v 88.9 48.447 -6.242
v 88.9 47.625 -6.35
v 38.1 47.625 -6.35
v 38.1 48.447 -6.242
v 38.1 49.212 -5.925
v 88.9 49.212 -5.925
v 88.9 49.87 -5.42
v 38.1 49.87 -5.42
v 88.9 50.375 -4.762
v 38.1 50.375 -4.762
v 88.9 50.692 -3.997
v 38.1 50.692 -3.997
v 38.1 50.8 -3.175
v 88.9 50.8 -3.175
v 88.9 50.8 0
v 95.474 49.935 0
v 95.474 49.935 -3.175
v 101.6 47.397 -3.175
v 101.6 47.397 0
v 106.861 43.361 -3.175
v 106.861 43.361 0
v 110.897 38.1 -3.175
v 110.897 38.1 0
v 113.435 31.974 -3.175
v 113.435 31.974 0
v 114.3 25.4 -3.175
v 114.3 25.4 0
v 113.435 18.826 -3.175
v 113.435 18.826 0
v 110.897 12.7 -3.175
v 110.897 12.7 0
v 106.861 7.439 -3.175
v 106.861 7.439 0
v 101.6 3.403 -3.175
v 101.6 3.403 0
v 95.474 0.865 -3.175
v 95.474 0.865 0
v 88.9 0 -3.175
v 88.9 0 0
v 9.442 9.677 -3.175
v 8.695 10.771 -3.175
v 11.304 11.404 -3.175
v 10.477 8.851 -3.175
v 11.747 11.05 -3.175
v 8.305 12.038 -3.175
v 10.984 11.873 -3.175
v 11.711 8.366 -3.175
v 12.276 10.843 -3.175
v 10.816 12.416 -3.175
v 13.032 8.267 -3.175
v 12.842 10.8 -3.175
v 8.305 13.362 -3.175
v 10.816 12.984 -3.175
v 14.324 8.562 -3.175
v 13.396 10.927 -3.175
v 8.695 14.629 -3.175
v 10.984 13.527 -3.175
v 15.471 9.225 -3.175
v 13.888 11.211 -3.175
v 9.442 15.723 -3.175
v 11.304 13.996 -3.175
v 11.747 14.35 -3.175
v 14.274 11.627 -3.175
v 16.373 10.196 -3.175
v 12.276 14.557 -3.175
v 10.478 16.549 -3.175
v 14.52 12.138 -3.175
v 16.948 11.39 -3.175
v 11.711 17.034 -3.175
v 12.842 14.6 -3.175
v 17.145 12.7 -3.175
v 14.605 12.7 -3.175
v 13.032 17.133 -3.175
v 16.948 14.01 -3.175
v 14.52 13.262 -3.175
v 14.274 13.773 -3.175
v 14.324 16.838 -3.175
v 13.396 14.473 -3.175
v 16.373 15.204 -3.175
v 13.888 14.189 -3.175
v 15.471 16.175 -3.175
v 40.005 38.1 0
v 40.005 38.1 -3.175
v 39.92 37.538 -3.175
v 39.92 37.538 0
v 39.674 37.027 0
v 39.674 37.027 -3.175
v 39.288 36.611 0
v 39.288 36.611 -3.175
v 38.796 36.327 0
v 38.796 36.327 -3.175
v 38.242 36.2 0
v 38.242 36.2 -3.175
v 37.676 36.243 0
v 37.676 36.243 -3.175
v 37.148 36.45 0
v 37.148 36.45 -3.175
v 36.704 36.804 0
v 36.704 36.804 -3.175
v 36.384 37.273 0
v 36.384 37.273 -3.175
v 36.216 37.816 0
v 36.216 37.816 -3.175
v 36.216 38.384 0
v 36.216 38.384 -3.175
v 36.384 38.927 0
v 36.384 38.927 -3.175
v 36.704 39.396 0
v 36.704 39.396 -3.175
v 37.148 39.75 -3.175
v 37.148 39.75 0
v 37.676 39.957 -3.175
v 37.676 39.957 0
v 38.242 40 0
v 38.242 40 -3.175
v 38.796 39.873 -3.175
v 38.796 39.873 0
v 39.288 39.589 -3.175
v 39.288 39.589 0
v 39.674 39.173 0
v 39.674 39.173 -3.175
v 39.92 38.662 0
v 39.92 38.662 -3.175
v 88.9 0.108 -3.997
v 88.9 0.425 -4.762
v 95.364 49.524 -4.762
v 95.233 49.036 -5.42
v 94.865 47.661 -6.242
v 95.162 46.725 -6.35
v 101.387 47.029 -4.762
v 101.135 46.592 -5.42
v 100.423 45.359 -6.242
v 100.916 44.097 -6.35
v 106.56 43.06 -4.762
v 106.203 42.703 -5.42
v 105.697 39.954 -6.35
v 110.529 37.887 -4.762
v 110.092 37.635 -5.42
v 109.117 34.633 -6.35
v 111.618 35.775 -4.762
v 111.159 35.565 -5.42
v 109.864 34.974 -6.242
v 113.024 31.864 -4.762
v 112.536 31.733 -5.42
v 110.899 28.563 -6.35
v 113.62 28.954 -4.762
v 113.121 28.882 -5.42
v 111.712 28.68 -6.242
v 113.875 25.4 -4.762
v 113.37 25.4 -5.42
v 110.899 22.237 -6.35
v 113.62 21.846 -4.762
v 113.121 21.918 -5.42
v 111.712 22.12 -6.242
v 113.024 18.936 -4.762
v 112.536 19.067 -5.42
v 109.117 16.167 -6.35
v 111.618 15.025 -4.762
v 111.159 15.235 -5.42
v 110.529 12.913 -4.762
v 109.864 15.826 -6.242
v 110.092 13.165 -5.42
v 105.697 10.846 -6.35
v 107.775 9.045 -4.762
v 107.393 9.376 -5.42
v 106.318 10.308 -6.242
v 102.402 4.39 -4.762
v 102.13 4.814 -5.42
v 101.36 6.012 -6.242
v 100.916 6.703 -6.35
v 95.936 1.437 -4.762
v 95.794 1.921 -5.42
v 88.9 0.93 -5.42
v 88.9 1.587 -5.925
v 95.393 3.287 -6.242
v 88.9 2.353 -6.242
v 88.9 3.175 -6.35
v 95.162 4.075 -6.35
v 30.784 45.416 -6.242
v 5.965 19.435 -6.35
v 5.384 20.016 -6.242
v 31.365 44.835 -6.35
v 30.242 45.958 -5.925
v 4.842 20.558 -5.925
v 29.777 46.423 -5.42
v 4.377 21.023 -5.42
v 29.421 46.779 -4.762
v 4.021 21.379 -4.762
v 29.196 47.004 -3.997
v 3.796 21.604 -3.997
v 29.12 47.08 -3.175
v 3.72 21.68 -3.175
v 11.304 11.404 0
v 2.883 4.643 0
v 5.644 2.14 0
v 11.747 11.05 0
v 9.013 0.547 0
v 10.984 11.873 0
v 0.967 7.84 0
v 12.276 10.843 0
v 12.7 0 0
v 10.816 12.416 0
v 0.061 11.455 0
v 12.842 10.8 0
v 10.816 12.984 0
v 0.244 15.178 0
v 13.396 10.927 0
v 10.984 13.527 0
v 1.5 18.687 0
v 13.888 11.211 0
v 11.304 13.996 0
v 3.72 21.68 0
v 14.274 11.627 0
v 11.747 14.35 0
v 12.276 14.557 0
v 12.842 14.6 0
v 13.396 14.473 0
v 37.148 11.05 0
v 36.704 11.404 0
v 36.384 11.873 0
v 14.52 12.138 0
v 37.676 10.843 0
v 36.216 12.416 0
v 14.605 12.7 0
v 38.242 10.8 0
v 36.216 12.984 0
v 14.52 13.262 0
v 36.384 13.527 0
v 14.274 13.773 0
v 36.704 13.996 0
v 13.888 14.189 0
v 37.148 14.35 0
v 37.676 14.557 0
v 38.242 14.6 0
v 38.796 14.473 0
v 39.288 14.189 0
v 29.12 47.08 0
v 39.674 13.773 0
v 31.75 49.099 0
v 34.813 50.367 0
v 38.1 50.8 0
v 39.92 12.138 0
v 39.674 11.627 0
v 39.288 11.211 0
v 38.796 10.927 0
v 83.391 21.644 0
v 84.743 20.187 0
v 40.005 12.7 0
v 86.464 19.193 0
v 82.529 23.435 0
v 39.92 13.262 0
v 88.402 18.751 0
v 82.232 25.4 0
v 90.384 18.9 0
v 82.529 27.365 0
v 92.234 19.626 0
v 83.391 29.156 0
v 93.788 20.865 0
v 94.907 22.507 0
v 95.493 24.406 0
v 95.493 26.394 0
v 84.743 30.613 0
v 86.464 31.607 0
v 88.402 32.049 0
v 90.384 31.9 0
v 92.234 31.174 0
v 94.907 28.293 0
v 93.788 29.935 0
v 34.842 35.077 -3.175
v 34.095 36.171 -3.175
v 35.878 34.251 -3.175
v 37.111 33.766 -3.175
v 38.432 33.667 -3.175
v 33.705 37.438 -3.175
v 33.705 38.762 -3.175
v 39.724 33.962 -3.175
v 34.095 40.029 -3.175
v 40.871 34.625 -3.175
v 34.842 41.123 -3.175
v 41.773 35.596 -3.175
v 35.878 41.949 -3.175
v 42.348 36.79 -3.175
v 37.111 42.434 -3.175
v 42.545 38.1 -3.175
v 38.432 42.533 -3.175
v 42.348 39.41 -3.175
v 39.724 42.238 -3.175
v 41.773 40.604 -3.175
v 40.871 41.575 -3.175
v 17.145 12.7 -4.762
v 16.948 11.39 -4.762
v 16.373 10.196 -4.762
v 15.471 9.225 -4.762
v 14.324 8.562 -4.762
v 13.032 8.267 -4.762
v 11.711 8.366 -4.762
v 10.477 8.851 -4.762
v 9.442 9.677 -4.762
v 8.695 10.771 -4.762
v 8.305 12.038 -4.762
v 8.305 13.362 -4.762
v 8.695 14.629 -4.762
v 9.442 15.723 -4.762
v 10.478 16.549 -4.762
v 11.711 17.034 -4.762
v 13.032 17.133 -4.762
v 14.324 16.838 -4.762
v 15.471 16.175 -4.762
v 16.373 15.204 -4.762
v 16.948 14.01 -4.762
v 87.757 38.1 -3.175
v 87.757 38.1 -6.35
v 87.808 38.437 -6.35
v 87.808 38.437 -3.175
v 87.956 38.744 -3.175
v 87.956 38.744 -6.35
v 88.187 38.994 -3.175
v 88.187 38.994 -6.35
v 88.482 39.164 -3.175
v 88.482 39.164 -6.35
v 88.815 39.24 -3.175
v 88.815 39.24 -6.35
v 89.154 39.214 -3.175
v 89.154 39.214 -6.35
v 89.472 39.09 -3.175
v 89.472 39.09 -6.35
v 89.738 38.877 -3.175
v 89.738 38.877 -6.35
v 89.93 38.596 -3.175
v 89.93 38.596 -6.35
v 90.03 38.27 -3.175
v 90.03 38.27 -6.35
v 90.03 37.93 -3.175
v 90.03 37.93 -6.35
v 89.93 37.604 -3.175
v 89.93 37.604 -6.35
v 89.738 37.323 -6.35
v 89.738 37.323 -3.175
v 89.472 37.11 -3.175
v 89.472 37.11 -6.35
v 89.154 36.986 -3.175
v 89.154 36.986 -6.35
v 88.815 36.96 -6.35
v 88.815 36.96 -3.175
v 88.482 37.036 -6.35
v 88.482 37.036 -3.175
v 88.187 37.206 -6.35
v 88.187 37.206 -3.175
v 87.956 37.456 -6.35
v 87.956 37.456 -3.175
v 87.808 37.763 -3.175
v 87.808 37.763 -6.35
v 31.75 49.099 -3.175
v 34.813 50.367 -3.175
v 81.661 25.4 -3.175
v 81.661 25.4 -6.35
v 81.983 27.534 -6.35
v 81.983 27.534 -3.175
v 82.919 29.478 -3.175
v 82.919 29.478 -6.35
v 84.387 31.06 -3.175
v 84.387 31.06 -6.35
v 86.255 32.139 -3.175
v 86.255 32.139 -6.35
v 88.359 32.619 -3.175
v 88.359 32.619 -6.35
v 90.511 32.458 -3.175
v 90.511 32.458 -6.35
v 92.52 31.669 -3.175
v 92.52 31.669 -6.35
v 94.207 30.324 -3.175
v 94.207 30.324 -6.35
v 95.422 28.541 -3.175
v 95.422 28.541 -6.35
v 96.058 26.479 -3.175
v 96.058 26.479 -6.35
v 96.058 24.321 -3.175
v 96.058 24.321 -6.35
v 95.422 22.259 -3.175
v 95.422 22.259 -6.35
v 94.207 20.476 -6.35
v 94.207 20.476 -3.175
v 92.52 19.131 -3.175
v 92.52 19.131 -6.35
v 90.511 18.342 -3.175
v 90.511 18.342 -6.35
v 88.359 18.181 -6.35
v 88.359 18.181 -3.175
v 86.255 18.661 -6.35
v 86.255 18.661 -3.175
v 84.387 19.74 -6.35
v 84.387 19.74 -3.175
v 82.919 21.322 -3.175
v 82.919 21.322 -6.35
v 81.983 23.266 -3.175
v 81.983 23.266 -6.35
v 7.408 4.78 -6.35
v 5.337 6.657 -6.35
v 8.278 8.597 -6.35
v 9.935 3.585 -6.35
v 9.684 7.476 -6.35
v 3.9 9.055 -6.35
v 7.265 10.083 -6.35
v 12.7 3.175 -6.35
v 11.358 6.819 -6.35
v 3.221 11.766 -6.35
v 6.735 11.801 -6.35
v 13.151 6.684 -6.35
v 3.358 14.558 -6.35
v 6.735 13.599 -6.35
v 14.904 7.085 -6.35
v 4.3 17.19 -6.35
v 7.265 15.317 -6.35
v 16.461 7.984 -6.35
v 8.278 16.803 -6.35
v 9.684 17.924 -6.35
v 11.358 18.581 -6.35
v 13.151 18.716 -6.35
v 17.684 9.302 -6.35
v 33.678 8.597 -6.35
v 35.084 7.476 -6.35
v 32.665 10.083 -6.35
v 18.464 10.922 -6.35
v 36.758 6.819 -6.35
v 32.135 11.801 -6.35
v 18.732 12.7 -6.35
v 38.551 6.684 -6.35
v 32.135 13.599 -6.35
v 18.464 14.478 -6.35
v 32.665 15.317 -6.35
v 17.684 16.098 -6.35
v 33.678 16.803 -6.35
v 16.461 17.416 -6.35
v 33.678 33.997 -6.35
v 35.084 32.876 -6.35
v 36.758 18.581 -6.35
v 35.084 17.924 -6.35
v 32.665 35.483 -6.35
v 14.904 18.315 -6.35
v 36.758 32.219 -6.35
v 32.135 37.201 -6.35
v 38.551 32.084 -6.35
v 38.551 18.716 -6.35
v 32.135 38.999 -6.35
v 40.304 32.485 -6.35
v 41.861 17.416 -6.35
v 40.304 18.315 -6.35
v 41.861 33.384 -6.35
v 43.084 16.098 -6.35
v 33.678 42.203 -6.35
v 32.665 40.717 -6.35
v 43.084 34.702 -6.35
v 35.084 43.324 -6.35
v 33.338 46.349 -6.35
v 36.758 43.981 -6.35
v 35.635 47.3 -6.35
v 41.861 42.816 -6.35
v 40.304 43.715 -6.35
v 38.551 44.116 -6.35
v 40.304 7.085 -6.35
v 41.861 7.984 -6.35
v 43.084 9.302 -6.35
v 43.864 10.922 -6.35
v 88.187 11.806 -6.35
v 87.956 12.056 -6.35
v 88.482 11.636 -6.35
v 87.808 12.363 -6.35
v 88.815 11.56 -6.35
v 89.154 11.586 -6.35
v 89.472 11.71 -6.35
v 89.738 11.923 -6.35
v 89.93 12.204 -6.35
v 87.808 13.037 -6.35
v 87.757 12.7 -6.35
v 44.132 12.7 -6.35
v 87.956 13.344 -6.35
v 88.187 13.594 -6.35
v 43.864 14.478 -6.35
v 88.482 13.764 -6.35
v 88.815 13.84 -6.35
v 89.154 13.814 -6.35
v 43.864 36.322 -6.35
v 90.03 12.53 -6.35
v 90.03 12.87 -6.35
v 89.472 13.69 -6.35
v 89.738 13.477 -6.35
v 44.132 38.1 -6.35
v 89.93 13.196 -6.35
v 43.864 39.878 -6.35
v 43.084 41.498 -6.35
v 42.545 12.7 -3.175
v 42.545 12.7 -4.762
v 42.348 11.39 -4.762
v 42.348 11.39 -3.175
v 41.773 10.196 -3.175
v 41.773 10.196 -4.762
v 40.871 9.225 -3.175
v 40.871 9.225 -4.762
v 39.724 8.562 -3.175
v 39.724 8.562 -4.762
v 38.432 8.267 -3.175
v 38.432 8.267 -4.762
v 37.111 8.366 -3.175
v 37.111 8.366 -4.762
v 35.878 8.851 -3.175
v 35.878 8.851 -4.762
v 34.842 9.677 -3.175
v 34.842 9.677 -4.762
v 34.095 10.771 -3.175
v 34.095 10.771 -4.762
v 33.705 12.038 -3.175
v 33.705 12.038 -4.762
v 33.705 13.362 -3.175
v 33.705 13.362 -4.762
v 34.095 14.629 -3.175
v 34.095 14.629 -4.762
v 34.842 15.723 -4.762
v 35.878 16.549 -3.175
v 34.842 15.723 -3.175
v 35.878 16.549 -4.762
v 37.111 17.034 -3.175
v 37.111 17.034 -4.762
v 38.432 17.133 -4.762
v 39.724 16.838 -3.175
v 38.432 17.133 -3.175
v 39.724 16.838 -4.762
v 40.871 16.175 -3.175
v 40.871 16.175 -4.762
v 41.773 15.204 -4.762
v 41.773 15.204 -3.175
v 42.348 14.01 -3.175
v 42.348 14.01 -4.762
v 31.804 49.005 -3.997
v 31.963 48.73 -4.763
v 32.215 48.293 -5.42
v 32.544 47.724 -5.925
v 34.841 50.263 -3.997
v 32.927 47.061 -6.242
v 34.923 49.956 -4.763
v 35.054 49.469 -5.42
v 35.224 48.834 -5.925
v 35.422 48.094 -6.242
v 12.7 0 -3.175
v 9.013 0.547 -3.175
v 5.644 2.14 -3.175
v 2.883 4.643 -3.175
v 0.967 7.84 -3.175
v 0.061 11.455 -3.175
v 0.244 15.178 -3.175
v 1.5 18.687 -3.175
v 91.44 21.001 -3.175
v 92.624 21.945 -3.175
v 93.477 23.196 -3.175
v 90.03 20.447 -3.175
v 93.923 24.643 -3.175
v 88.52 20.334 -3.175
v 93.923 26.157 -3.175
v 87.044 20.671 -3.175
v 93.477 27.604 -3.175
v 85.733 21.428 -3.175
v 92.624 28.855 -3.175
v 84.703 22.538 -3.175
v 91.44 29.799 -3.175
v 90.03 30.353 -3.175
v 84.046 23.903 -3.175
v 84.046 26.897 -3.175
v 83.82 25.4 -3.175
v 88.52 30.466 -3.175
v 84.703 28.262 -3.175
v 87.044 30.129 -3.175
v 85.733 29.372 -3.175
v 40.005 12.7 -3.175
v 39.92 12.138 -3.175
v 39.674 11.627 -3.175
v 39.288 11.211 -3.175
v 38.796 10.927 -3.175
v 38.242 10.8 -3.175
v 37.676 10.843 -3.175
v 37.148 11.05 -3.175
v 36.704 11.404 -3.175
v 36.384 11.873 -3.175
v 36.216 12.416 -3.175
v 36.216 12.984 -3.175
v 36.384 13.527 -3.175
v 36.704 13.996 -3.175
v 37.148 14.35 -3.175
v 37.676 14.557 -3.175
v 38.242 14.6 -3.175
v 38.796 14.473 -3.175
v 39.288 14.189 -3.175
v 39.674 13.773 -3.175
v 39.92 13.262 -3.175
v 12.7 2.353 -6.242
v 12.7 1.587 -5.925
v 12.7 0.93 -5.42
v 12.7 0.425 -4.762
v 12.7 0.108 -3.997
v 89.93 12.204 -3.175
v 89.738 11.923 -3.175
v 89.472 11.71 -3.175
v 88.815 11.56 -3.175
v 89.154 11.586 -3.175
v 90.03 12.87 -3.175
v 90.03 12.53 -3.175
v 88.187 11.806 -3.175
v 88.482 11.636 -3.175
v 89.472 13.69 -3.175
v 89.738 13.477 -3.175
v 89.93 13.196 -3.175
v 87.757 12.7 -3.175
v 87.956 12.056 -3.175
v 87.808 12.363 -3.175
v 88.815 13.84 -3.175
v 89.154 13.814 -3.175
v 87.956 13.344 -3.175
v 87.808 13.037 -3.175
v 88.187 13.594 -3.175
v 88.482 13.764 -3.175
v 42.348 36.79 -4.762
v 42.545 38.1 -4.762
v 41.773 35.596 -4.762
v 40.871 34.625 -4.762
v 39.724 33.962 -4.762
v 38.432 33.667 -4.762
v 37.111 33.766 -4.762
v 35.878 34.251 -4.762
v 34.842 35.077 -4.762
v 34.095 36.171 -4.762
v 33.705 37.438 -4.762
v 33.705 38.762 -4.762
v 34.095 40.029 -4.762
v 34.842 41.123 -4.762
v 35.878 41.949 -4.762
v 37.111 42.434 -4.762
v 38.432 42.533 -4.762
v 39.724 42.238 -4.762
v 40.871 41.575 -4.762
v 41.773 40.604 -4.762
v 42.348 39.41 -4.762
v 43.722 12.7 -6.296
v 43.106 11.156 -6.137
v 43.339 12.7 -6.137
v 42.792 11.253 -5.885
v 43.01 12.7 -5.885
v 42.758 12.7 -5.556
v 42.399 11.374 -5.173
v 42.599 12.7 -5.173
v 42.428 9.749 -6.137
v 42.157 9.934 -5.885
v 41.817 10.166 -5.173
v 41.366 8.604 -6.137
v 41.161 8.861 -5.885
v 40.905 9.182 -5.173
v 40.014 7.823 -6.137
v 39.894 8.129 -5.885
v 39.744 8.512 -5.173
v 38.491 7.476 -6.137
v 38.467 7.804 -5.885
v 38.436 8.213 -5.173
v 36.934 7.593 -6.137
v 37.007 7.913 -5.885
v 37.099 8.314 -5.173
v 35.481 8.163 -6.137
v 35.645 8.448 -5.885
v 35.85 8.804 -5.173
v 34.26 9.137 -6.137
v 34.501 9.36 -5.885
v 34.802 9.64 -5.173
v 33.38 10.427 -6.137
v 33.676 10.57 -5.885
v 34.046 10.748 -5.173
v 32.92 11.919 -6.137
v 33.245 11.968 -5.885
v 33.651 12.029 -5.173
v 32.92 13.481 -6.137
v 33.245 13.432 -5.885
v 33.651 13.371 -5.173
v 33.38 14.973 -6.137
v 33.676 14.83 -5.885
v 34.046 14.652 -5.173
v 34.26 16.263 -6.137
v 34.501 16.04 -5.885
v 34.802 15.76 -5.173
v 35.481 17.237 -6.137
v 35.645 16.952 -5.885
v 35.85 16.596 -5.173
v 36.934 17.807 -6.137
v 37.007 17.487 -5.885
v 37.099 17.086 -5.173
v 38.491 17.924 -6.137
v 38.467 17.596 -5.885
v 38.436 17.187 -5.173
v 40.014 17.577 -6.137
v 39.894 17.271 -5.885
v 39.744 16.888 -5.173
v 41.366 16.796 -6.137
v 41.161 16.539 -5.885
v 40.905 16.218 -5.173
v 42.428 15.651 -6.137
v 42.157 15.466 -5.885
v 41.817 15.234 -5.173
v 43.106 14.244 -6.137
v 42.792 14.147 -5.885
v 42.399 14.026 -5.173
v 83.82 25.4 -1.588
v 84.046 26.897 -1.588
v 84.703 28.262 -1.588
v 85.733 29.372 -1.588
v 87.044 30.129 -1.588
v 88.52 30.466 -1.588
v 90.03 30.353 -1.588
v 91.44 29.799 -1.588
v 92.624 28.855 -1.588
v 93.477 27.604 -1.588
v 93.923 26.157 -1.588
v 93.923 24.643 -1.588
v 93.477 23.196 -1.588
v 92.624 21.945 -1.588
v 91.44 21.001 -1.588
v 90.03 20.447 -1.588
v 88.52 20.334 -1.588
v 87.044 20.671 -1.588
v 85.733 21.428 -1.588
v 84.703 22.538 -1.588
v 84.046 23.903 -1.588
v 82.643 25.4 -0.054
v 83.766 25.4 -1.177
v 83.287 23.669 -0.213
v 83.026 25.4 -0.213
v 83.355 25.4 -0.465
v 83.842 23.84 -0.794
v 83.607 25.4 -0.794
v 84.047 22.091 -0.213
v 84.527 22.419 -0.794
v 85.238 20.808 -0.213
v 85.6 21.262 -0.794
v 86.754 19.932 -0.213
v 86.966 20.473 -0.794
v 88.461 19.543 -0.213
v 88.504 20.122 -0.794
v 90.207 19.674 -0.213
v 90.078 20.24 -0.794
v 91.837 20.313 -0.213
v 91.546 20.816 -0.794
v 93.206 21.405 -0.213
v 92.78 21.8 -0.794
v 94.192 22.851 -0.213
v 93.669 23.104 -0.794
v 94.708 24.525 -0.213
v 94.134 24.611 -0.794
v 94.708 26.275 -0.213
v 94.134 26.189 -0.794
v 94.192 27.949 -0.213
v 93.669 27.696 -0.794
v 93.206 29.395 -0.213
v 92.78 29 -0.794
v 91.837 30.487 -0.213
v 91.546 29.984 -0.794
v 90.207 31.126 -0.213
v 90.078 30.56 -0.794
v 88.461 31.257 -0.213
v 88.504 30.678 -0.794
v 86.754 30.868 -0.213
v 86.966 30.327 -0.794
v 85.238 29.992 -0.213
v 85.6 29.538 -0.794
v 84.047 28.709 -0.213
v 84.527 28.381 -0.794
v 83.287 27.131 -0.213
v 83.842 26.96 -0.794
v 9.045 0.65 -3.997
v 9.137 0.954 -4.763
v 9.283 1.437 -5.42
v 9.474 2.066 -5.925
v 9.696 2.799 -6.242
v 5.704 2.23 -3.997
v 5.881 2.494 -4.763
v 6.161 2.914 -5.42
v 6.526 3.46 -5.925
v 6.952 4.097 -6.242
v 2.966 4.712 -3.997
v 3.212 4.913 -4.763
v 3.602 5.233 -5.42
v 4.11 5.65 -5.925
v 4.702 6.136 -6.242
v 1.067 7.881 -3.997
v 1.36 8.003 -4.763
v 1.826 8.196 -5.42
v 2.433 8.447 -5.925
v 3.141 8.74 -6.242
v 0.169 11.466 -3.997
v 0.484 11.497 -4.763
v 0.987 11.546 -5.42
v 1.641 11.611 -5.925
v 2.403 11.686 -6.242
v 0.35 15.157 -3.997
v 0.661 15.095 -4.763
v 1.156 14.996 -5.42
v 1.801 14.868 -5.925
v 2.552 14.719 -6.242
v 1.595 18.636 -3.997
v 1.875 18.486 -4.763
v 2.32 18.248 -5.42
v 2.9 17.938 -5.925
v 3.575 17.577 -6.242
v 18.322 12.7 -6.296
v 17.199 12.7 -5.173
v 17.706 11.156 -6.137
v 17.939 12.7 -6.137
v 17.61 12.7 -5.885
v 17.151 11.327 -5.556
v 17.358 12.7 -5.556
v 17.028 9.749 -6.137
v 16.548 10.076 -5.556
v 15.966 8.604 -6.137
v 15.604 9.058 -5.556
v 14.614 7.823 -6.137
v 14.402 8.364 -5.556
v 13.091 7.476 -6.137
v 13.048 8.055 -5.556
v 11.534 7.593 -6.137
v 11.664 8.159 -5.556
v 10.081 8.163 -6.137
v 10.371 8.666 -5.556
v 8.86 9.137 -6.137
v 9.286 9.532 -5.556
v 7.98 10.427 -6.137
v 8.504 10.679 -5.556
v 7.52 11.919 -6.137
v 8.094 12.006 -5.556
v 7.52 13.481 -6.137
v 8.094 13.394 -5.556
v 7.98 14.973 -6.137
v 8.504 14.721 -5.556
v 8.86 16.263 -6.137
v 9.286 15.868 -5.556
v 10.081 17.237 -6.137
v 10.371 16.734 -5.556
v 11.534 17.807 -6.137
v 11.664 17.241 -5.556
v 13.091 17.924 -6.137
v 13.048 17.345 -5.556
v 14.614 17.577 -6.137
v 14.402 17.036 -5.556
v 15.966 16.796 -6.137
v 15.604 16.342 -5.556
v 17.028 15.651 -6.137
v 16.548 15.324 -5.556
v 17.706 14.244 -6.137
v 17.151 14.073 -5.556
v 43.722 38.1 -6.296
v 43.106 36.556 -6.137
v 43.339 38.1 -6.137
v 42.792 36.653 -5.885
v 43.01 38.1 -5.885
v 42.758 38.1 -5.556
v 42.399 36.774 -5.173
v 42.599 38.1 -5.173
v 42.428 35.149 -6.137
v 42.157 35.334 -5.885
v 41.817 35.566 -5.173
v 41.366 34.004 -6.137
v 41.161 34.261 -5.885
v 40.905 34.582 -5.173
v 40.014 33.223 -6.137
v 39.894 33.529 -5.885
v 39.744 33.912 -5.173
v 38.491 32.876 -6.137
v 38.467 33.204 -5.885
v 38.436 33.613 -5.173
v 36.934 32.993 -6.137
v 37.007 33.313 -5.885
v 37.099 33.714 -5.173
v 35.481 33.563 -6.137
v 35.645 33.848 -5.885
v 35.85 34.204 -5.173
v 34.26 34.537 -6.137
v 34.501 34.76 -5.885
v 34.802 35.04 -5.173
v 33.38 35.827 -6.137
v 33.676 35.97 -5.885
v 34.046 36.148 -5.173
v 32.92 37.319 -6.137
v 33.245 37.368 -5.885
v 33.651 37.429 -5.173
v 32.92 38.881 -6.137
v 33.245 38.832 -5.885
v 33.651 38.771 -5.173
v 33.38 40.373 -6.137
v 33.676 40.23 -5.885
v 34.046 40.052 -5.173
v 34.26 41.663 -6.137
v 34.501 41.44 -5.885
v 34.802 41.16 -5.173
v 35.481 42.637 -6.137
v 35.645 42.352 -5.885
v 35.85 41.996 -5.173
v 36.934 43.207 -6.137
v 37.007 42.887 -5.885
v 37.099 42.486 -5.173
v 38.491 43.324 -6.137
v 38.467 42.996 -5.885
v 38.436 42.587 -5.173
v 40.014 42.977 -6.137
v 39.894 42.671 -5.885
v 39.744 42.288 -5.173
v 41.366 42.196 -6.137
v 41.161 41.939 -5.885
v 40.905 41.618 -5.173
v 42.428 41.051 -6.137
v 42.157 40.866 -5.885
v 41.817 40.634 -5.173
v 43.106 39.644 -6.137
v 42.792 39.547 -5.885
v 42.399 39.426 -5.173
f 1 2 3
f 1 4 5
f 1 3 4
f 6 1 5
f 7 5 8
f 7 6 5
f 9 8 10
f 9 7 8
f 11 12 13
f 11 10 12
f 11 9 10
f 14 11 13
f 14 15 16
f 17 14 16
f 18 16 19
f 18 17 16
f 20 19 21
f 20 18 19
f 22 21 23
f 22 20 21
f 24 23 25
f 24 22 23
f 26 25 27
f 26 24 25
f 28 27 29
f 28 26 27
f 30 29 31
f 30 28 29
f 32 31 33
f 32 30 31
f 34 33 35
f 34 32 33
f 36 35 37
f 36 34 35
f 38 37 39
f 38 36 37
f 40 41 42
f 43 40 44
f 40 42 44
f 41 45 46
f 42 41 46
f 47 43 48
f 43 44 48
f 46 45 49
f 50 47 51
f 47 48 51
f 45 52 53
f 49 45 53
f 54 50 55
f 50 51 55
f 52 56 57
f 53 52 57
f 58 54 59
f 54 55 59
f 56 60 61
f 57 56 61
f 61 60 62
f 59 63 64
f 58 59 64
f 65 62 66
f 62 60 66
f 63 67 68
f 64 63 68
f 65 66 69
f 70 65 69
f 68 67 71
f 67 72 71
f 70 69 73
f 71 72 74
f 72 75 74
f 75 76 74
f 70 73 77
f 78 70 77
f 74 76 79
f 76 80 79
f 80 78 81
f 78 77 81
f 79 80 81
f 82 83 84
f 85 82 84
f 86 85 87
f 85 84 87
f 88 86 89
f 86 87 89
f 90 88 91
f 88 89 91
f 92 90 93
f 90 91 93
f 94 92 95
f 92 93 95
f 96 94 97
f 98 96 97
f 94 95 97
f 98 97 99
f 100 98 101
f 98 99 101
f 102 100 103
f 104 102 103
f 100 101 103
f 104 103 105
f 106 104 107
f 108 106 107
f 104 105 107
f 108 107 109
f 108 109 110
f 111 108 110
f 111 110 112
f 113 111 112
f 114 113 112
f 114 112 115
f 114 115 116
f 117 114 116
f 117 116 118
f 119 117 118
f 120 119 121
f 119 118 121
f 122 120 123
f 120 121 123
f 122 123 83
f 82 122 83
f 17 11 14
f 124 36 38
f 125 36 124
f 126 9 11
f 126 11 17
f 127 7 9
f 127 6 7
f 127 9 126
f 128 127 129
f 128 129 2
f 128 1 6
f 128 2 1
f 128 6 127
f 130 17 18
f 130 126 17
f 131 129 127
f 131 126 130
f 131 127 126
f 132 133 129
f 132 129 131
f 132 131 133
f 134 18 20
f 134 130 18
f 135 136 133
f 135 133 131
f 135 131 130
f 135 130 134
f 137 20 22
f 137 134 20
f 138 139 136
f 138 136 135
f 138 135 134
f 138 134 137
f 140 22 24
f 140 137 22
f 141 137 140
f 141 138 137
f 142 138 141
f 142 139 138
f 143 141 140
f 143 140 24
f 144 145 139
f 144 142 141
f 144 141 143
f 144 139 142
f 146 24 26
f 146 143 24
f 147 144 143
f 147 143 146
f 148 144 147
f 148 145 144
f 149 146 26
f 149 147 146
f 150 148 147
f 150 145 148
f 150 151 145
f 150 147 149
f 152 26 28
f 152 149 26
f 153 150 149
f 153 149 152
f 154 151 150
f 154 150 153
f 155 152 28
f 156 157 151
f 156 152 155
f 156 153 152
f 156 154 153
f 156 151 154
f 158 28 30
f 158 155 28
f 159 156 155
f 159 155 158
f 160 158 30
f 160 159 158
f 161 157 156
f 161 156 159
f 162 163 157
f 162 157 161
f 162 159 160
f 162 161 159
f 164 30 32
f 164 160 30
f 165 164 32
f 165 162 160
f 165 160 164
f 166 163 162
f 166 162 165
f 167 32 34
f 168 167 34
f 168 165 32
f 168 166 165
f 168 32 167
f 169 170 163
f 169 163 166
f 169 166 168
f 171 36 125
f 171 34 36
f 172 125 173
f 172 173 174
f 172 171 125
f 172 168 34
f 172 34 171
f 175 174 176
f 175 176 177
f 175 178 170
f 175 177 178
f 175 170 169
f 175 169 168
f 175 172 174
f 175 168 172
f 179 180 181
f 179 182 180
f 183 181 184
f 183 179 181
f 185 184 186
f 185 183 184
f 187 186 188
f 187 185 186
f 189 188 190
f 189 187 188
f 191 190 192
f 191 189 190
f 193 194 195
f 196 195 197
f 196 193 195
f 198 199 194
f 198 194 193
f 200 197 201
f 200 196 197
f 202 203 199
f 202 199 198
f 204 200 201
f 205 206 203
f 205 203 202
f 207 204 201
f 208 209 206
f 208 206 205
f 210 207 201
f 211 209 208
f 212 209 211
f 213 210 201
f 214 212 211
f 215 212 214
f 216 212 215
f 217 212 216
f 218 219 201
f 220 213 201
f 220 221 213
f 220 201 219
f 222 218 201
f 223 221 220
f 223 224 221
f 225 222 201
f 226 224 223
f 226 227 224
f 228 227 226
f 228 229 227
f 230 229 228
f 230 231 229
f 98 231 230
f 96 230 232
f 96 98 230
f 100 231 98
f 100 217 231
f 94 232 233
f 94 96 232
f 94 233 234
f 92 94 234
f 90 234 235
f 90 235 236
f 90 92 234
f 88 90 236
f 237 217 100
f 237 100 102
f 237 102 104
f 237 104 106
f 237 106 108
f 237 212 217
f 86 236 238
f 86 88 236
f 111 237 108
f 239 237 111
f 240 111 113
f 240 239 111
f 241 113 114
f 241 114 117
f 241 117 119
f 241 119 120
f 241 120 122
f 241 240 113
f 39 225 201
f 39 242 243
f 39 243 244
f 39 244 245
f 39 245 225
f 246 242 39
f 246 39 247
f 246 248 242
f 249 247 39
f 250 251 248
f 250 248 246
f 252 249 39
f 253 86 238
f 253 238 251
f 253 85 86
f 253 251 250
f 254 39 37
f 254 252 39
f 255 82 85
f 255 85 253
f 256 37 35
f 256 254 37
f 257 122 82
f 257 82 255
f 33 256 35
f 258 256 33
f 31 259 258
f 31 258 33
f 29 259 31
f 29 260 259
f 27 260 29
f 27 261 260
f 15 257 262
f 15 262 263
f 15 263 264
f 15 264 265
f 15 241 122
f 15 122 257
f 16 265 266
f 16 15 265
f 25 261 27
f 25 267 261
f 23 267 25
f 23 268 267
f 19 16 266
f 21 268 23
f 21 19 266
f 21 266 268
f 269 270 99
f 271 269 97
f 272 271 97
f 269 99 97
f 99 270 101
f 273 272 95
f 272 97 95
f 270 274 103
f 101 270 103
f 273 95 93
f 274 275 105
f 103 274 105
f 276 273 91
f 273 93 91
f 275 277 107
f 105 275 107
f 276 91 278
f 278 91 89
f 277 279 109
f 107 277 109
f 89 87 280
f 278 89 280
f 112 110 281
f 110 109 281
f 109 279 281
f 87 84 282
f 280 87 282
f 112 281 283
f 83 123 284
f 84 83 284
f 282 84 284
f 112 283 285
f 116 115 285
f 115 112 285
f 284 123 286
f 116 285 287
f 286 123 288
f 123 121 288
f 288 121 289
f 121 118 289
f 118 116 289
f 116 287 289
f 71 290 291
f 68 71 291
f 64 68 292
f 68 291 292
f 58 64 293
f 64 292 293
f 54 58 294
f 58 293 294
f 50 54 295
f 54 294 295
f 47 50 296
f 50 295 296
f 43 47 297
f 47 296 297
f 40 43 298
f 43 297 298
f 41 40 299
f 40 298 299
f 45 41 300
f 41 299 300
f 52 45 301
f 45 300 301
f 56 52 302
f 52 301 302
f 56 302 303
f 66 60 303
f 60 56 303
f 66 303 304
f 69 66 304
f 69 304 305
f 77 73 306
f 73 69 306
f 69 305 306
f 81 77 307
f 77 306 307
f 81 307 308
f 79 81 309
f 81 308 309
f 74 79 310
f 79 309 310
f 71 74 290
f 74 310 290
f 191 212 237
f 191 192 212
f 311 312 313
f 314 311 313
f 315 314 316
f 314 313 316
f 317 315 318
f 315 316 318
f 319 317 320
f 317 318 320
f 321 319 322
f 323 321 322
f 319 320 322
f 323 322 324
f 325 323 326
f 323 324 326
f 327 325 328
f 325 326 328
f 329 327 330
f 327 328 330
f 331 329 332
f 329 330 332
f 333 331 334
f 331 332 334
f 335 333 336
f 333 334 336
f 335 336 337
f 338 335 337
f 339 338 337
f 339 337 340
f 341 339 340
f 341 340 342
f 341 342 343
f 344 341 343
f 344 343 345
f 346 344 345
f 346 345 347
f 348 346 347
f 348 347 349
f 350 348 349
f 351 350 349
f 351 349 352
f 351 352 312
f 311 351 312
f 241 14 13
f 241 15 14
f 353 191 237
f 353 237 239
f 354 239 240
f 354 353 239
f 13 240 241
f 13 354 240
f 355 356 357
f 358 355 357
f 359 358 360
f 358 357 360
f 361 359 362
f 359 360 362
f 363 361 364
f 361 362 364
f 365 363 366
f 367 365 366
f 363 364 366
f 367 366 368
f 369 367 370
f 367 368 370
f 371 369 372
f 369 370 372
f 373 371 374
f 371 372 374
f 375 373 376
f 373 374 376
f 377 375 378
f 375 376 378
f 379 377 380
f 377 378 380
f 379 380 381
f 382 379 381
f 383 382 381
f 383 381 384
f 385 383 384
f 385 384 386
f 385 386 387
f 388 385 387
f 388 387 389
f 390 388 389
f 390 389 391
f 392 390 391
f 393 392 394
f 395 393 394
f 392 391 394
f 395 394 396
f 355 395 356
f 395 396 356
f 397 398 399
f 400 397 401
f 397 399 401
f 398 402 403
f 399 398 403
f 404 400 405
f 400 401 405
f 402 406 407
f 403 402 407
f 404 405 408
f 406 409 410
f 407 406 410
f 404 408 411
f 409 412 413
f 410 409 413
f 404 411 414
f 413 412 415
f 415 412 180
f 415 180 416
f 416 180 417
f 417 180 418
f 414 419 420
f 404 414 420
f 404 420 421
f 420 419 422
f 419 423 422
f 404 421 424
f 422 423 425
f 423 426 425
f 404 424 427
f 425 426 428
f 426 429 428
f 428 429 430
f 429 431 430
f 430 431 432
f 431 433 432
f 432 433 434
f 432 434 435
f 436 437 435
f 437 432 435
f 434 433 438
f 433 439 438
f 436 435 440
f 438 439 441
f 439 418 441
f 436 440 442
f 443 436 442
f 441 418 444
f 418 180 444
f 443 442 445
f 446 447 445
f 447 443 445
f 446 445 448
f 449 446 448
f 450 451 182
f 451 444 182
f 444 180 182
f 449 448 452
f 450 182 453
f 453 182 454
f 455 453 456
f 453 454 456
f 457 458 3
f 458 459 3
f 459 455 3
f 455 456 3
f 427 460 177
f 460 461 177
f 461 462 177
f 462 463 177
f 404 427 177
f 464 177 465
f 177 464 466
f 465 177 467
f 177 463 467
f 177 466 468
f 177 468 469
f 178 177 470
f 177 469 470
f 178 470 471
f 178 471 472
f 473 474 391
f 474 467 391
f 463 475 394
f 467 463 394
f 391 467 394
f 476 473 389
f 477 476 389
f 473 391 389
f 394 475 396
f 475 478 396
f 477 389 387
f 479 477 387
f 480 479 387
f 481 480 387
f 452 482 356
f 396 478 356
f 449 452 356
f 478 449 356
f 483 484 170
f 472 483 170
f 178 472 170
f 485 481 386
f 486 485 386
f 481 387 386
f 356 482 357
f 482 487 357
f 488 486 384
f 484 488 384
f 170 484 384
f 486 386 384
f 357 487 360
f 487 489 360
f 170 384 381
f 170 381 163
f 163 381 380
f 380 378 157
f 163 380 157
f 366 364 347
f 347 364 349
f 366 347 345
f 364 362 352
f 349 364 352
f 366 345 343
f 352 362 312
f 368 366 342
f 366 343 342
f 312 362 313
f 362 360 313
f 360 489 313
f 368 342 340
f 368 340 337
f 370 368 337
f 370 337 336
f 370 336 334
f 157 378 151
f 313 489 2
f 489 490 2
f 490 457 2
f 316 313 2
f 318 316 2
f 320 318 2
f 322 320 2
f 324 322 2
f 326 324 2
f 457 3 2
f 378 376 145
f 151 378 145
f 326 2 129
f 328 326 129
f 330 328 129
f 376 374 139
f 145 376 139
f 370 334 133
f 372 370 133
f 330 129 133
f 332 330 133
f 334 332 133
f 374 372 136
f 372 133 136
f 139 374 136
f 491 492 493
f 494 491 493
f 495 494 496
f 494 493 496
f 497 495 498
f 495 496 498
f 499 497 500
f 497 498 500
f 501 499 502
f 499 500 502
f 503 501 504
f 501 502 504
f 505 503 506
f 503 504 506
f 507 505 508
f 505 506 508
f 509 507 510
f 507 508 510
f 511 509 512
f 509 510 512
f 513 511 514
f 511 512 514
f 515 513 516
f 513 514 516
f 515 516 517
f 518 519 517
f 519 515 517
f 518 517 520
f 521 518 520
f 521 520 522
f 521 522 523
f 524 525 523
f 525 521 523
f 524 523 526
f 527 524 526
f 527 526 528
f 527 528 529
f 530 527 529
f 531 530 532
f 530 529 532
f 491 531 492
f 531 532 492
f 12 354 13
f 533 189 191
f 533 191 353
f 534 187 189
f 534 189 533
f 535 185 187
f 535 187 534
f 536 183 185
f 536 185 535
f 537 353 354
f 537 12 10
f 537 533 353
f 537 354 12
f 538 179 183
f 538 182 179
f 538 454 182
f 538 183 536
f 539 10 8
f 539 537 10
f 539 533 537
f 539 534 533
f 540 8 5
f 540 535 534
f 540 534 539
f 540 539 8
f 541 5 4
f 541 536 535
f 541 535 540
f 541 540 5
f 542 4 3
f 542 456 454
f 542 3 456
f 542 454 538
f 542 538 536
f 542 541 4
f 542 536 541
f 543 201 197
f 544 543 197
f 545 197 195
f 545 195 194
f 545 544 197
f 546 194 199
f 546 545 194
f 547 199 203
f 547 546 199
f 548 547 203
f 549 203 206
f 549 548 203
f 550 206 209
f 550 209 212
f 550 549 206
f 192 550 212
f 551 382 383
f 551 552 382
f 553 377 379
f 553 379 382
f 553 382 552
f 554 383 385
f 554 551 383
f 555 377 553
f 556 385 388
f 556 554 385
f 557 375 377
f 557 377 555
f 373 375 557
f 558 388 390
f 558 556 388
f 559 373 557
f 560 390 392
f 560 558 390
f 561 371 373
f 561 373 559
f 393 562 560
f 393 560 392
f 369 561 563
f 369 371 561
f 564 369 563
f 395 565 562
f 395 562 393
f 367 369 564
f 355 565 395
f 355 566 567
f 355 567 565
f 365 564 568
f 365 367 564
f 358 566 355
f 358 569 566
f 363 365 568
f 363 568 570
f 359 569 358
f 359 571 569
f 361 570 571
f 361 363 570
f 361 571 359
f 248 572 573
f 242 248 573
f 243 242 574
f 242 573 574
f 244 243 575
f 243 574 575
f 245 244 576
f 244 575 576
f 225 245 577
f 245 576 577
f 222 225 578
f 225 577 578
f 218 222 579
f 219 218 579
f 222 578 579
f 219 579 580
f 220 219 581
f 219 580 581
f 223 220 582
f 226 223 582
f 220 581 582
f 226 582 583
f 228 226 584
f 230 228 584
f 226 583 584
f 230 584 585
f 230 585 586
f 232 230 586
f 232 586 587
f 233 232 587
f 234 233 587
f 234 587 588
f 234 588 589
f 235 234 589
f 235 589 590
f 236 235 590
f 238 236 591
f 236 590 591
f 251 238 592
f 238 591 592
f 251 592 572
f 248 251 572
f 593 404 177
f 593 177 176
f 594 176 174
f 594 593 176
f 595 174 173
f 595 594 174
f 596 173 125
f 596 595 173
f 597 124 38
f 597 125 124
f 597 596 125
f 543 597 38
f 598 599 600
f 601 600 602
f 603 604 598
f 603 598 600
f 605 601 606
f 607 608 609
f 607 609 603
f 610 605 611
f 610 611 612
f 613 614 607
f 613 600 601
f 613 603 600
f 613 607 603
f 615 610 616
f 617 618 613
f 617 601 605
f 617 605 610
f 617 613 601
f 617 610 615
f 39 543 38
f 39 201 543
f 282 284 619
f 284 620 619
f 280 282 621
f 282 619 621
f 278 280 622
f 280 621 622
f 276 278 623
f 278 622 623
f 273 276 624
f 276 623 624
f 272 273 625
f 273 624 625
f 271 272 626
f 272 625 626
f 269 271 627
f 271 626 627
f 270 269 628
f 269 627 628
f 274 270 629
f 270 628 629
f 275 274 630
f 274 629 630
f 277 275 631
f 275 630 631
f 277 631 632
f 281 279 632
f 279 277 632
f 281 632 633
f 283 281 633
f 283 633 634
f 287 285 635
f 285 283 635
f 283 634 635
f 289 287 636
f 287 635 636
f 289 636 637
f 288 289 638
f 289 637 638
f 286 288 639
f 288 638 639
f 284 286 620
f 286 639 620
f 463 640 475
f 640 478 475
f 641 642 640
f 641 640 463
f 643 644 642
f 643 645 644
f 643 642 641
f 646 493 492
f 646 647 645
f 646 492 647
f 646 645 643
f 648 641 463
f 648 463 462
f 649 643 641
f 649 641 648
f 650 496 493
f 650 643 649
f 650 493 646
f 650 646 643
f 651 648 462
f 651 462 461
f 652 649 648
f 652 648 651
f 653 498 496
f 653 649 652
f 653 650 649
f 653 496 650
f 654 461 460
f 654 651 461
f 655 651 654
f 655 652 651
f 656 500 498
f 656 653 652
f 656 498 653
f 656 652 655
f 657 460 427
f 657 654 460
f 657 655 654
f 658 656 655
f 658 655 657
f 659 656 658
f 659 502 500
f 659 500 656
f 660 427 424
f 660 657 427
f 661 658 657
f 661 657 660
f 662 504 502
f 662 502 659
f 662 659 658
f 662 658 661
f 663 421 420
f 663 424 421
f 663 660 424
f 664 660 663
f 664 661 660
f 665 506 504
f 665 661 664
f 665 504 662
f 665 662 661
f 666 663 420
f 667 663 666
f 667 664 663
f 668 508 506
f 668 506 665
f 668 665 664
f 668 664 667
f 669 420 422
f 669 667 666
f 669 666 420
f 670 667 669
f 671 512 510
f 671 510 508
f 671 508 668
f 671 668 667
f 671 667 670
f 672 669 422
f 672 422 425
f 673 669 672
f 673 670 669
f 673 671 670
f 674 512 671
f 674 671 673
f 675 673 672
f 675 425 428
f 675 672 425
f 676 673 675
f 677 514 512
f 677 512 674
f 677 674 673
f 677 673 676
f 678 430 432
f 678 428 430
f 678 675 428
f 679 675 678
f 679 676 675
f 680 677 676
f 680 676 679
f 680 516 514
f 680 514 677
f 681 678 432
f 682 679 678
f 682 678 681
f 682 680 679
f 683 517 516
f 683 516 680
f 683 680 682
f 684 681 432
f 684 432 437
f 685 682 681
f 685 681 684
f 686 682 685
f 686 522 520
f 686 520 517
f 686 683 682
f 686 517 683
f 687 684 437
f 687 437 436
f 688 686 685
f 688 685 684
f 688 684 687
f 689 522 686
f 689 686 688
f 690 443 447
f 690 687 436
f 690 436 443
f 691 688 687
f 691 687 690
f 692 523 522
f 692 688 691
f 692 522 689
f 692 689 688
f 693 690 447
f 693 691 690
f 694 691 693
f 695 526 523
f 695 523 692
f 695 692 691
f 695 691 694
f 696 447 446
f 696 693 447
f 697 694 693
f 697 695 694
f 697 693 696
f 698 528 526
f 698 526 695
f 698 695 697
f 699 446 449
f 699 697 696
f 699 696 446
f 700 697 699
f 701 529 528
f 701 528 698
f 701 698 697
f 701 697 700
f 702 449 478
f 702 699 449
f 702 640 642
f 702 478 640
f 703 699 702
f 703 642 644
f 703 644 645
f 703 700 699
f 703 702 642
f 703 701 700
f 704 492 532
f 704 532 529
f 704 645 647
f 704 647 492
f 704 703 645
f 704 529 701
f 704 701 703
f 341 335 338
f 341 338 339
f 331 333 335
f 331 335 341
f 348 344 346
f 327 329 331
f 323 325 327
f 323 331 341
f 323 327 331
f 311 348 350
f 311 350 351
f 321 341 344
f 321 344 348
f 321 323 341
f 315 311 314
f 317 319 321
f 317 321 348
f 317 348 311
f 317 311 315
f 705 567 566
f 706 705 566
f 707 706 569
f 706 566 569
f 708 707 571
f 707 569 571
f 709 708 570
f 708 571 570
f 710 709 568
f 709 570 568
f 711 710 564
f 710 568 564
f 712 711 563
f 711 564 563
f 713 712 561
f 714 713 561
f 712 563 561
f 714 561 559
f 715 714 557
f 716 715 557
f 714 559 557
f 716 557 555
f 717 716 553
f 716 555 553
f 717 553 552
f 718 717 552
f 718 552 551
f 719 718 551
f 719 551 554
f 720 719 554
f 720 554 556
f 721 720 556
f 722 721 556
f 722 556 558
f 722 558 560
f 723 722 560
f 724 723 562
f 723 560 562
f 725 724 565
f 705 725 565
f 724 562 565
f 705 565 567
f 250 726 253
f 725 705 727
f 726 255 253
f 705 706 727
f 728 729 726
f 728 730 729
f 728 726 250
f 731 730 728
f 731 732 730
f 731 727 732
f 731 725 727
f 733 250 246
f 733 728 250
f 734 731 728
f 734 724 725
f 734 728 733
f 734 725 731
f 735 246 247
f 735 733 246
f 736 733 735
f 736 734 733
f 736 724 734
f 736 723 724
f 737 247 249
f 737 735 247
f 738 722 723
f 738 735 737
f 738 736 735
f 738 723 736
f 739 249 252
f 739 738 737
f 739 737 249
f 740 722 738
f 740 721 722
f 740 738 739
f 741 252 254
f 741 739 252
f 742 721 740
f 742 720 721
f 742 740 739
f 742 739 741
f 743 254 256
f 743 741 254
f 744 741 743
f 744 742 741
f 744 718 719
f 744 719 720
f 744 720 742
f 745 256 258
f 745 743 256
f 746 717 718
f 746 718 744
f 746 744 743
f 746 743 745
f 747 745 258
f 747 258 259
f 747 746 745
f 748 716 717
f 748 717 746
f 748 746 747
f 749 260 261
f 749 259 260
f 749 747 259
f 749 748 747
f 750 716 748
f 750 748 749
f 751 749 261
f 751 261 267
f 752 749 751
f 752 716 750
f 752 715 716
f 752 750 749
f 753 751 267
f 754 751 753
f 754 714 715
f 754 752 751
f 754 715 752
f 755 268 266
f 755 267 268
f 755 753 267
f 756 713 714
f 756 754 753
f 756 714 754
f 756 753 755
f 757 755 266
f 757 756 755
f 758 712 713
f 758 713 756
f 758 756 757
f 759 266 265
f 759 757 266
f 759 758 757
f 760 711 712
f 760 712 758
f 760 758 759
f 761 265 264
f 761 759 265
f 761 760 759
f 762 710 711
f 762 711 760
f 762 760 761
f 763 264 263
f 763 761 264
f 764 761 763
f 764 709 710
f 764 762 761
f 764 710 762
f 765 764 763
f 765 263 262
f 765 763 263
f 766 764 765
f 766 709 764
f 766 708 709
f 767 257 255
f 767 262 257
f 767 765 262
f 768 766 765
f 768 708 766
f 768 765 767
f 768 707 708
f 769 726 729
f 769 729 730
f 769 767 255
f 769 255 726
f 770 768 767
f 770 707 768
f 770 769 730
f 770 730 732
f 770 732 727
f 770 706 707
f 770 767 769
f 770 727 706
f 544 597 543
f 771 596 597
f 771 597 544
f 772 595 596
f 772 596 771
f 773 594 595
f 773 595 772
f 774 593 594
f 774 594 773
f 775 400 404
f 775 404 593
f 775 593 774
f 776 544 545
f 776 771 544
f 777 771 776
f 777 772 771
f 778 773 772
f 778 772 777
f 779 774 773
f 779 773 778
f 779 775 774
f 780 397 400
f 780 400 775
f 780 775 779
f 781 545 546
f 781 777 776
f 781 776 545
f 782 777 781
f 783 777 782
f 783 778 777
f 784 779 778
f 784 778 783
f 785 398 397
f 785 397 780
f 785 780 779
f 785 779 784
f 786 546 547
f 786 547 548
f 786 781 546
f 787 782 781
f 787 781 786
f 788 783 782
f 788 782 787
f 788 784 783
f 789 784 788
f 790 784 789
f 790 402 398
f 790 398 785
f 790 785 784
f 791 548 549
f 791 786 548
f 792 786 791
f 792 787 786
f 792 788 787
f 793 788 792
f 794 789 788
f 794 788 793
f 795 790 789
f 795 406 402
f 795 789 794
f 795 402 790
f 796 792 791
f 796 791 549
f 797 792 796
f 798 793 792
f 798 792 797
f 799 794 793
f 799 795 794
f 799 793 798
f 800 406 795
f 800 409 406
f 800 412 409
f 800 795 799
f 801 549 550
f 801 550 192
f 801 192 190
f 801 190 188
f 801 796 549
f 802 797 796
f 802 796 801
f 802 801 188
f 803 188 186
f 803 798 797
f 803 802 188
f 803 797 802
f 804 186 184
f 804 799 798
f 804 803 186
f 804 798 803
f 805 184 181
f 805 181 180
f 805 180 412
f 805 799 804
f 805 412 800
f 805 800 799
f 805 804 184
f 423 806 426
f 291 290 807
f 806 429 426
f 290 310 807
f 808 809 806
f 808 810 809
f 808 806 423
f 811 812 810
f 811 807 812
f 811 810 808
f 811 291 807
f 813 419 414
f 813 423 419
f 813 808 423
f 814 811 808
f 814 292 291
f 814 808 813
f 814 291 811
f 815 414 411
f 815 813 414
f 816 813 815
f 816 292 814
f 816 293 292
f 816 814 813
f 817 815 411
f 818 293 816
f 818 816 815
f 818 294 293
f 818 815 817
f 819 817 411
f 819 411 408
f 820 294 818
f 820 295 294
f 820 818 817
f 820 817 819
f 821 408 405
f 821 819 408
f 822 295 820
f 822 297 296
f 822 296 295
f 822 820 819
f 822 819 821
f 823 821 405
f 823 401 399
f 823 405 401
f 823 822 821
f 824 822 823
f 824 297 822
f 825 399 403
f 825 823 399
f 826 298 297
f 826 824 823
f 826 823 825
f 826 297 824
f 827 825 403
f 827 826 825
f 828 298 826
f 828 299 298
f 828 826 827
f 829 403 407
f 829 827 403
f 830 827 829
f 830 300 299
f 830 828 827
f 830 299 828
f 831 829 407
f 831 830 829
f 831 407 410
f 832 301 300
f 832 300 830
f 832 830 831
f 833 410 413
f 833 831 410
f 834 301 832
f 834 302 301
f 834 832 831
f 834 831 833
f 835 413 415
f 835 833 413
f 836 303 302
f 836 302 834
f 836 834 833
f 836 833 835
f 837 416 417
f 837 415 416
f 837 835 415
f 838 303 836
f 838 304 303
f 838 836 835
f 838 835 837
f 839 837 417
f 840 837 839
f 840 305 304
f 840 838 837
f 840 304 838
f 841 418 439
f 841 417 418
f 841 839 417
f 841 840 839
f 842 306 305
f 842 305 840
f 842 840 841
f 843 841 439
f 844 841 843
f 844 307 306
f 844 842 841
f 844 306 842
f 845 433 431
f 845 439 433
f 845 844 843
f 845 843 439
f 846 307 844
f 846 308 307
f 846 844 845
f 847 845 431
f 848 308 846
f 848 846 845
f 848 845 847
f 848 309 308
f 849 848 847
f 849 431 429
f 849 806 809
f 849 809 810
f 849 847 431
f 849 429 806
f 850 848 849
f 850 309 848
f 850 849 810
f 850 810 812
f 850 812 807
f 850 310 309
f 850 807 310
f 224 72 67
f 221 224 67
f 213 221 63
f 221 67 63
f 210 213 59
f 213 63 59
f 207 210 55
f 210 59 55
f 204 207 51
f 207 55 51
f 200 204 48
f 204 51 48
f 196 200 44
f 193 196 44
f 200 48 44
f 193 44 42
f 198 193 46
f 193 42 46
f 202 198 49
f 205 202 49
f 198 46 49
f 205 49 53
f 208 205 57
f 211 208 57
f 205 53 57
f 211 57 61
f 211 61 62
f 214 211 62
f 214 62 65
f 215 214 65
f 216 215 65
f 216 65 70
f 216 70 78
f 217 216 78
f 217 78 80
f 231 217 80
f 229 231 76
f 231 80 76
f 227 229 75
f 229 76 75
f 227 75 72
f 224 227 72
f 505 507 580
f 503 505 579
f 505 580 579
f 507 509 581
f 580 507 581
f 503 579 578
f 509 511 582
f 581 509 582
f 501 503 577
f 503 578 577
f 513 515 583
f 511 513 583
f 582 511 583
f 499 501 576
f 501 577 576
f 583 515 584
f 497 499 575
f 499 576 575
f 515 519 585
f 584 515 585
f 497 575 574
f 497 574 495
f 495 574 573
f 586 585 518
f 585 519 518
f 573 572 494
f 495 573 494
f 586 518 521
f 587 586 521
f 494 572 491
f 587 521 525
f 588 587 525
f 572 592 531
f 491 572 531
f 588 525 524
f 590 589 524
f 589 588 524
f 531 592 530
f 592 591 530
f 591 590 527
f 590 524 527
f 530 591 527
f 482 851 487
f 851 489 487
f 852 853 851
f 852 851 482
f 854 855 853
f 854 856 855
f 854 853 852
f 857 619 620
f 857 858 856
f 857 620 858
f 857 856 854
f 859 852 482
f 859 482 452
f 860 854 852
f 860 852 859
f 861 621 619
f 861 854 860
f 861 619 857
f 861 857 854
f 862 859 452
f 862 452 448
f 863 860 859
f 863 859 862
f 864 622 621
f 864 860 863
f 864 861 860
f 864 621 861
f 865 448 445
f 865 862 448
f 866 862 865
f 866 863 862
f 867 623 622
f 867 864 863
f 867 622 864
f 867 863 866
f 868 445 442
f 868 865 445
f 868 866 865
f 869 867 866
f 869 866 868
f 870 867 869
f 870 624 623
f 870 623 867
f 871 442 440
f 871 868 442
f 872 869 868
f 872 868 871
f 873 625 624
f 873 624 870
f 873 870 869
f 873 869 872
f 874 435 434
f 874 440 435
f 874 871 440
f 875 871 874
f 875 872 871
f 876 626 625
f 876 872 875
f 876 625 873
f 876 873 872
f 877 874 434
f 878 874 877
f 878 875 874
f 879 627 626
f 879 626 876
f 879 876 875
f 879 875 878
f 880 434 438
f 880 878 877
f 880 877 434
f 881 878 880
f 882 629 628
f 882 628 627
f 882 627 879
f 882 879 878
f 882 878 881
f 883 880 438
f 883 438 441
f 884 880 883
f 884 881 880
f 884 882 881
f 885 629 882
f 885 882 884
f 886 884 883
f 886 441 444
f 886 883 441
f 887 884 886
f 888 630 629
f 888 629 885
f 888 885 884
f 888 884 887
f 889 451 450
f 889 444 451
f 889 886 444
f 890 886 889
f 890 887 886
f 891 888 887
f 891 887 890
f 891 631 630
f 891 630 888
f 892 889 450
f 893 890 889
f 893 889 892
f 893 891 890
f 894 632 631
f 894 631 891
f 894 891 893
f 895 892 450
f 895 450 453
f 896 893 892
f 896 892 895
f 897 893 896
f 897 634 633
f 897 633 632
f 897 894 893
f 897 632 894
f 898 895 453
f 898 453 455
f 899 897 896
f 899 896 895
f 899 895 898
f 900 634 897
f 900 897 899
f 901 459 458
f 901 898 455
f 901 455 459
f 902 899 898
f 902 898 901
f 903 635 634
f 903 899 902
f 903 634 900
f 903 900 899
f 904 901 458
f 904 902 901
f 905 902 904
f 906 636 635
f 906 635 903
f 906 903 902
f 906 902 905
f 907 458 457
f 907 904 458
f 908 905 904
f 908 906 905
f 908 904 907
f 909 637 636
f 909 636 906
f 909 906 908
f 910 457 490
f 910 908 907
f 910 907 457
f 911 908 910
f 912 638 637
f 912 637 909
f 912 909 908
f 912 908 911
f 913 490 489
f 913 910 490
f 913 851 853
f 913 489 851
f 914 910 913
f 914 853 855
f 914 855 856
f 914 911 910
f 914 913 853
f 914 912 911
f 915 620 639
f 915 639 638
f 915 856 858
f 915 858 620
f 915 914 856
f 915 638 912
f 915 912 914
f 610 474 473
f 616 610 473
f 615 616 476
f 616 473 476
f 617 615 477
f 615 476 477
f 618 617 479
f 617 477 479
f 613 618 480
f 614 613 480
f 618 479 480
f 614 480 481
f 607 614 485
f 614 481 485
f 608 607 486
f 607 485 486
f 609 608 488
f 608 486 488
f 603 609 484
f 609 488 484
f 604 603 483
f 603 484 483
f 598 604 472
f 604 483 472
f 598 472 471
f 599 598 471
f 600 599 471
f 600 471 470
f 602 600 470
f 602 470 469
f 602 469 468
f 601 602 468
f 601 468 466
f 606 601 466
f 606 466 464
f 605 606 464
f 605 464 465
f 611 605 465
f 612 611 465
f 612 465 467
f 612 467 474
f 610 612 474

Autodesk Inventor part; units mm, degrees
ref_plane "YZ Plane" through (0, 0, 0) normal (1, 0, 0) x (0, 1, 0)
ref_plane "XZ Plane" through (0, 0, 0) normal (0, 1, 0) x (-1, 0, 0)
ref_plane "XY Plane" through (0, 0, 0) normal (0, 0, 1) x (1, 0, 0)
sketch "Sketch1" plane through (0, 0, 0) normal (0, 0, 1) x (1, 0, 0)
  line L0 (0, 0) -> (114.3, 0)
  line L1 (114.3, 0) -> (114.3, 50.8)
  line L2 (114.3, 50.8) -> (0, 50.8)
  line L3 (0, 50.8) -> (0, 0)
  dimension "d0" = 114.3
  dimension "d1" = 50.8
extrude "Extrusion1" add sketch "Sketch1" against normal blind 6.35
sketch "Sketch2" plane through (0, 0, -6.35) normal (0, 0, 1) x (1, 0, 0)
  line L0 (114.3, 0) -> (114.3, 50.8) projected
  line L1 (114.3, 50.8) -> (0, 50.8) projected
  line L2 (0, 50.8) -> (0, 0) projected
  line L3 (0, 0) -> (114.3, 0) projected
  line L4 (0, 25.4) -> (114.3, 25.4) construction
  circle A0 centre (12.7, 12.7) radius 1.905
  circle A1 centre (12.7, 12.7) radius 4.445
  circle A2 centre (38.1, 12.7) radius 1.905
  circle A3 centre (38.1, 12.7) radius 4.445
  circle A4 centre (38.1, 38.1) radius 1.905
  circle A5 centre (38.1, 38.1) radius 4.445
  line L5 (0, 17.9605) -> (32.8395, 50.8)
  line L6 (0, 0) -> (50.8, 50.8) construction
  circle A6 centre (38.1, 38.1) radius 12.7 construction
  dimension "d4" = 3.81
  dimension "d5" = 8.89
  dimension "d6" = 25.4
  dimension "d7" = 25.4
  dimension "d8" = 12.7
  dimension "d10" = 12.7
extrude "Extrusion2" cut sketch "Sketch2" along normal through all contours L5 L2 L1 | A0 | A2 | A4
extrude "Extrusion3" cut sketch "Sketch2" along normal blind 3.175 contours A1 | A3 | A5
sketch "Sketch7" plane through (0, 0, -6.35) normal (0, 0, -1) x (-1, 0, 0)
  circle A0 centre (-88.9, 25.4) radius 7.239
  circle A1 centre (-88.9, 25.4) radius 5.08
  circle A2 centre (-88.9, 38.1) radius 1.143
  circle A3 centre (-88.9, 12.7) radius 1.143
  circle A4 centre (-38.1, 12.7) radius 4.445 projected
  circle A5 centre (-12.7, 12.7) radius 4.445 projected
  circle A6 centre (-38.1, 38.1) radius 4.445 projected
  line L0 (0, 17.9605) -> (-32.8395, 50.8) projected
  line L1 (-32.8395, 50.8) -> (-114.3, 50.8) projected
  line L2 (-114.3, 50.8) -> (-114.3, 0) projected
  line L3 (-114.3, 0) -> (0, 0) projected
  line L4 (0, 0) -> (0, 17.9605) projected
  line L5 (-114.3, 25.4) -> (-7.4395, 25.4) construction
  line L6 (-88.9, 50.8) -> (-88.9, 0) construction
  dimension "d40" = 25.4
  dimension "d41" = 14.478
  dimension "d42" = 10.16
  dimension "d43" = 2.286
  dimension "d44" = 12.7
  dimension "d45" = 12.7
extrude "Extrusion9" cut sketch "Sketch7" against normal through all contours A1
extrude "Extrusion10" cut sketch "Sketch7" against normal blind 3.175 contours A0 | A2 | A3
sketch "Sketch8" plane through (0, 0, -6.35) normal (0, 0, -1) x (-1, 0, 0)
  circle A0 centre (-88.9, 25.4) radius 7.239 projected
  circle A1 centre (-88.9, 12.7) radius 1.143 projected
  circle A2 centre (-88.9, 38.1) radius 1.143 projected
  circle A3 centre (-38.1, 12.7) radius 4.445 projected
  circle A4 centre (-12.7, 12.7) radius 4.445 projected
  circle A5 centre (-38.1, 38.1) radius 4.445 projected
  line L0 (0, 17.9605) -> (-32.8395, 50.8) projected
  line L1 (-32.8395, 50.8) -> (-114.3, 50.8) projected
  line L2 (-114.3, 50.8) -> (-114.3, 0) projected
  line L3 (-114.3, 0) -> (0, 0) projected
  line L4 (0, 0) -> (0, 17.9605) projected
  circle A6 centre (-38.1, 38.1) radius 12.7
  circle A7 centre (-12.7, 12.7) radius 12.7
  circle A8 centre (-88.9, 25.4) radius 25.4
  point P0 (-3.7197, 21.6803)
  point P1 (0, 12.7)
  point P2 (-12.7, 0)
  point P3 (-38.1, 50.8)
  point P4 (-29.1197, 47.0803)
  point P5 (-114.3, 25.4)
  point P6 (-88.9, 50.8)
  point P7 (-88.9, 0)
extrude "Extrusion11" cut sketch "Sketch8" against normal through all contours L4 A7 L0 | L4 L3 A7 | A6 L1 L0 | L3 L2 A8 | A8 L2 L1
fillet "Fillet5" radius 1.5875 3 edges at (33.655, 38.1, -6.35) (33.655, 12.7, -6.35) (8.255, 12.7, -6.35)
fillet "Fillet6" radius 1.5875 1 edges at (93.98, 25.4, 0)
fillet "Fillet7" radius 3.175 6 edges at (114.3, 25.4, -6.35) (50.8, 0, -6.35) (0.9667, 7.8399, -6.35) (16.4197, 34.3803, -6.35) (33.2399, 49.8333, -6.35) (63.5, 50.8, -6.35)
equation "\"d45\" = d44"
properties part number "Bearing Bracket"
